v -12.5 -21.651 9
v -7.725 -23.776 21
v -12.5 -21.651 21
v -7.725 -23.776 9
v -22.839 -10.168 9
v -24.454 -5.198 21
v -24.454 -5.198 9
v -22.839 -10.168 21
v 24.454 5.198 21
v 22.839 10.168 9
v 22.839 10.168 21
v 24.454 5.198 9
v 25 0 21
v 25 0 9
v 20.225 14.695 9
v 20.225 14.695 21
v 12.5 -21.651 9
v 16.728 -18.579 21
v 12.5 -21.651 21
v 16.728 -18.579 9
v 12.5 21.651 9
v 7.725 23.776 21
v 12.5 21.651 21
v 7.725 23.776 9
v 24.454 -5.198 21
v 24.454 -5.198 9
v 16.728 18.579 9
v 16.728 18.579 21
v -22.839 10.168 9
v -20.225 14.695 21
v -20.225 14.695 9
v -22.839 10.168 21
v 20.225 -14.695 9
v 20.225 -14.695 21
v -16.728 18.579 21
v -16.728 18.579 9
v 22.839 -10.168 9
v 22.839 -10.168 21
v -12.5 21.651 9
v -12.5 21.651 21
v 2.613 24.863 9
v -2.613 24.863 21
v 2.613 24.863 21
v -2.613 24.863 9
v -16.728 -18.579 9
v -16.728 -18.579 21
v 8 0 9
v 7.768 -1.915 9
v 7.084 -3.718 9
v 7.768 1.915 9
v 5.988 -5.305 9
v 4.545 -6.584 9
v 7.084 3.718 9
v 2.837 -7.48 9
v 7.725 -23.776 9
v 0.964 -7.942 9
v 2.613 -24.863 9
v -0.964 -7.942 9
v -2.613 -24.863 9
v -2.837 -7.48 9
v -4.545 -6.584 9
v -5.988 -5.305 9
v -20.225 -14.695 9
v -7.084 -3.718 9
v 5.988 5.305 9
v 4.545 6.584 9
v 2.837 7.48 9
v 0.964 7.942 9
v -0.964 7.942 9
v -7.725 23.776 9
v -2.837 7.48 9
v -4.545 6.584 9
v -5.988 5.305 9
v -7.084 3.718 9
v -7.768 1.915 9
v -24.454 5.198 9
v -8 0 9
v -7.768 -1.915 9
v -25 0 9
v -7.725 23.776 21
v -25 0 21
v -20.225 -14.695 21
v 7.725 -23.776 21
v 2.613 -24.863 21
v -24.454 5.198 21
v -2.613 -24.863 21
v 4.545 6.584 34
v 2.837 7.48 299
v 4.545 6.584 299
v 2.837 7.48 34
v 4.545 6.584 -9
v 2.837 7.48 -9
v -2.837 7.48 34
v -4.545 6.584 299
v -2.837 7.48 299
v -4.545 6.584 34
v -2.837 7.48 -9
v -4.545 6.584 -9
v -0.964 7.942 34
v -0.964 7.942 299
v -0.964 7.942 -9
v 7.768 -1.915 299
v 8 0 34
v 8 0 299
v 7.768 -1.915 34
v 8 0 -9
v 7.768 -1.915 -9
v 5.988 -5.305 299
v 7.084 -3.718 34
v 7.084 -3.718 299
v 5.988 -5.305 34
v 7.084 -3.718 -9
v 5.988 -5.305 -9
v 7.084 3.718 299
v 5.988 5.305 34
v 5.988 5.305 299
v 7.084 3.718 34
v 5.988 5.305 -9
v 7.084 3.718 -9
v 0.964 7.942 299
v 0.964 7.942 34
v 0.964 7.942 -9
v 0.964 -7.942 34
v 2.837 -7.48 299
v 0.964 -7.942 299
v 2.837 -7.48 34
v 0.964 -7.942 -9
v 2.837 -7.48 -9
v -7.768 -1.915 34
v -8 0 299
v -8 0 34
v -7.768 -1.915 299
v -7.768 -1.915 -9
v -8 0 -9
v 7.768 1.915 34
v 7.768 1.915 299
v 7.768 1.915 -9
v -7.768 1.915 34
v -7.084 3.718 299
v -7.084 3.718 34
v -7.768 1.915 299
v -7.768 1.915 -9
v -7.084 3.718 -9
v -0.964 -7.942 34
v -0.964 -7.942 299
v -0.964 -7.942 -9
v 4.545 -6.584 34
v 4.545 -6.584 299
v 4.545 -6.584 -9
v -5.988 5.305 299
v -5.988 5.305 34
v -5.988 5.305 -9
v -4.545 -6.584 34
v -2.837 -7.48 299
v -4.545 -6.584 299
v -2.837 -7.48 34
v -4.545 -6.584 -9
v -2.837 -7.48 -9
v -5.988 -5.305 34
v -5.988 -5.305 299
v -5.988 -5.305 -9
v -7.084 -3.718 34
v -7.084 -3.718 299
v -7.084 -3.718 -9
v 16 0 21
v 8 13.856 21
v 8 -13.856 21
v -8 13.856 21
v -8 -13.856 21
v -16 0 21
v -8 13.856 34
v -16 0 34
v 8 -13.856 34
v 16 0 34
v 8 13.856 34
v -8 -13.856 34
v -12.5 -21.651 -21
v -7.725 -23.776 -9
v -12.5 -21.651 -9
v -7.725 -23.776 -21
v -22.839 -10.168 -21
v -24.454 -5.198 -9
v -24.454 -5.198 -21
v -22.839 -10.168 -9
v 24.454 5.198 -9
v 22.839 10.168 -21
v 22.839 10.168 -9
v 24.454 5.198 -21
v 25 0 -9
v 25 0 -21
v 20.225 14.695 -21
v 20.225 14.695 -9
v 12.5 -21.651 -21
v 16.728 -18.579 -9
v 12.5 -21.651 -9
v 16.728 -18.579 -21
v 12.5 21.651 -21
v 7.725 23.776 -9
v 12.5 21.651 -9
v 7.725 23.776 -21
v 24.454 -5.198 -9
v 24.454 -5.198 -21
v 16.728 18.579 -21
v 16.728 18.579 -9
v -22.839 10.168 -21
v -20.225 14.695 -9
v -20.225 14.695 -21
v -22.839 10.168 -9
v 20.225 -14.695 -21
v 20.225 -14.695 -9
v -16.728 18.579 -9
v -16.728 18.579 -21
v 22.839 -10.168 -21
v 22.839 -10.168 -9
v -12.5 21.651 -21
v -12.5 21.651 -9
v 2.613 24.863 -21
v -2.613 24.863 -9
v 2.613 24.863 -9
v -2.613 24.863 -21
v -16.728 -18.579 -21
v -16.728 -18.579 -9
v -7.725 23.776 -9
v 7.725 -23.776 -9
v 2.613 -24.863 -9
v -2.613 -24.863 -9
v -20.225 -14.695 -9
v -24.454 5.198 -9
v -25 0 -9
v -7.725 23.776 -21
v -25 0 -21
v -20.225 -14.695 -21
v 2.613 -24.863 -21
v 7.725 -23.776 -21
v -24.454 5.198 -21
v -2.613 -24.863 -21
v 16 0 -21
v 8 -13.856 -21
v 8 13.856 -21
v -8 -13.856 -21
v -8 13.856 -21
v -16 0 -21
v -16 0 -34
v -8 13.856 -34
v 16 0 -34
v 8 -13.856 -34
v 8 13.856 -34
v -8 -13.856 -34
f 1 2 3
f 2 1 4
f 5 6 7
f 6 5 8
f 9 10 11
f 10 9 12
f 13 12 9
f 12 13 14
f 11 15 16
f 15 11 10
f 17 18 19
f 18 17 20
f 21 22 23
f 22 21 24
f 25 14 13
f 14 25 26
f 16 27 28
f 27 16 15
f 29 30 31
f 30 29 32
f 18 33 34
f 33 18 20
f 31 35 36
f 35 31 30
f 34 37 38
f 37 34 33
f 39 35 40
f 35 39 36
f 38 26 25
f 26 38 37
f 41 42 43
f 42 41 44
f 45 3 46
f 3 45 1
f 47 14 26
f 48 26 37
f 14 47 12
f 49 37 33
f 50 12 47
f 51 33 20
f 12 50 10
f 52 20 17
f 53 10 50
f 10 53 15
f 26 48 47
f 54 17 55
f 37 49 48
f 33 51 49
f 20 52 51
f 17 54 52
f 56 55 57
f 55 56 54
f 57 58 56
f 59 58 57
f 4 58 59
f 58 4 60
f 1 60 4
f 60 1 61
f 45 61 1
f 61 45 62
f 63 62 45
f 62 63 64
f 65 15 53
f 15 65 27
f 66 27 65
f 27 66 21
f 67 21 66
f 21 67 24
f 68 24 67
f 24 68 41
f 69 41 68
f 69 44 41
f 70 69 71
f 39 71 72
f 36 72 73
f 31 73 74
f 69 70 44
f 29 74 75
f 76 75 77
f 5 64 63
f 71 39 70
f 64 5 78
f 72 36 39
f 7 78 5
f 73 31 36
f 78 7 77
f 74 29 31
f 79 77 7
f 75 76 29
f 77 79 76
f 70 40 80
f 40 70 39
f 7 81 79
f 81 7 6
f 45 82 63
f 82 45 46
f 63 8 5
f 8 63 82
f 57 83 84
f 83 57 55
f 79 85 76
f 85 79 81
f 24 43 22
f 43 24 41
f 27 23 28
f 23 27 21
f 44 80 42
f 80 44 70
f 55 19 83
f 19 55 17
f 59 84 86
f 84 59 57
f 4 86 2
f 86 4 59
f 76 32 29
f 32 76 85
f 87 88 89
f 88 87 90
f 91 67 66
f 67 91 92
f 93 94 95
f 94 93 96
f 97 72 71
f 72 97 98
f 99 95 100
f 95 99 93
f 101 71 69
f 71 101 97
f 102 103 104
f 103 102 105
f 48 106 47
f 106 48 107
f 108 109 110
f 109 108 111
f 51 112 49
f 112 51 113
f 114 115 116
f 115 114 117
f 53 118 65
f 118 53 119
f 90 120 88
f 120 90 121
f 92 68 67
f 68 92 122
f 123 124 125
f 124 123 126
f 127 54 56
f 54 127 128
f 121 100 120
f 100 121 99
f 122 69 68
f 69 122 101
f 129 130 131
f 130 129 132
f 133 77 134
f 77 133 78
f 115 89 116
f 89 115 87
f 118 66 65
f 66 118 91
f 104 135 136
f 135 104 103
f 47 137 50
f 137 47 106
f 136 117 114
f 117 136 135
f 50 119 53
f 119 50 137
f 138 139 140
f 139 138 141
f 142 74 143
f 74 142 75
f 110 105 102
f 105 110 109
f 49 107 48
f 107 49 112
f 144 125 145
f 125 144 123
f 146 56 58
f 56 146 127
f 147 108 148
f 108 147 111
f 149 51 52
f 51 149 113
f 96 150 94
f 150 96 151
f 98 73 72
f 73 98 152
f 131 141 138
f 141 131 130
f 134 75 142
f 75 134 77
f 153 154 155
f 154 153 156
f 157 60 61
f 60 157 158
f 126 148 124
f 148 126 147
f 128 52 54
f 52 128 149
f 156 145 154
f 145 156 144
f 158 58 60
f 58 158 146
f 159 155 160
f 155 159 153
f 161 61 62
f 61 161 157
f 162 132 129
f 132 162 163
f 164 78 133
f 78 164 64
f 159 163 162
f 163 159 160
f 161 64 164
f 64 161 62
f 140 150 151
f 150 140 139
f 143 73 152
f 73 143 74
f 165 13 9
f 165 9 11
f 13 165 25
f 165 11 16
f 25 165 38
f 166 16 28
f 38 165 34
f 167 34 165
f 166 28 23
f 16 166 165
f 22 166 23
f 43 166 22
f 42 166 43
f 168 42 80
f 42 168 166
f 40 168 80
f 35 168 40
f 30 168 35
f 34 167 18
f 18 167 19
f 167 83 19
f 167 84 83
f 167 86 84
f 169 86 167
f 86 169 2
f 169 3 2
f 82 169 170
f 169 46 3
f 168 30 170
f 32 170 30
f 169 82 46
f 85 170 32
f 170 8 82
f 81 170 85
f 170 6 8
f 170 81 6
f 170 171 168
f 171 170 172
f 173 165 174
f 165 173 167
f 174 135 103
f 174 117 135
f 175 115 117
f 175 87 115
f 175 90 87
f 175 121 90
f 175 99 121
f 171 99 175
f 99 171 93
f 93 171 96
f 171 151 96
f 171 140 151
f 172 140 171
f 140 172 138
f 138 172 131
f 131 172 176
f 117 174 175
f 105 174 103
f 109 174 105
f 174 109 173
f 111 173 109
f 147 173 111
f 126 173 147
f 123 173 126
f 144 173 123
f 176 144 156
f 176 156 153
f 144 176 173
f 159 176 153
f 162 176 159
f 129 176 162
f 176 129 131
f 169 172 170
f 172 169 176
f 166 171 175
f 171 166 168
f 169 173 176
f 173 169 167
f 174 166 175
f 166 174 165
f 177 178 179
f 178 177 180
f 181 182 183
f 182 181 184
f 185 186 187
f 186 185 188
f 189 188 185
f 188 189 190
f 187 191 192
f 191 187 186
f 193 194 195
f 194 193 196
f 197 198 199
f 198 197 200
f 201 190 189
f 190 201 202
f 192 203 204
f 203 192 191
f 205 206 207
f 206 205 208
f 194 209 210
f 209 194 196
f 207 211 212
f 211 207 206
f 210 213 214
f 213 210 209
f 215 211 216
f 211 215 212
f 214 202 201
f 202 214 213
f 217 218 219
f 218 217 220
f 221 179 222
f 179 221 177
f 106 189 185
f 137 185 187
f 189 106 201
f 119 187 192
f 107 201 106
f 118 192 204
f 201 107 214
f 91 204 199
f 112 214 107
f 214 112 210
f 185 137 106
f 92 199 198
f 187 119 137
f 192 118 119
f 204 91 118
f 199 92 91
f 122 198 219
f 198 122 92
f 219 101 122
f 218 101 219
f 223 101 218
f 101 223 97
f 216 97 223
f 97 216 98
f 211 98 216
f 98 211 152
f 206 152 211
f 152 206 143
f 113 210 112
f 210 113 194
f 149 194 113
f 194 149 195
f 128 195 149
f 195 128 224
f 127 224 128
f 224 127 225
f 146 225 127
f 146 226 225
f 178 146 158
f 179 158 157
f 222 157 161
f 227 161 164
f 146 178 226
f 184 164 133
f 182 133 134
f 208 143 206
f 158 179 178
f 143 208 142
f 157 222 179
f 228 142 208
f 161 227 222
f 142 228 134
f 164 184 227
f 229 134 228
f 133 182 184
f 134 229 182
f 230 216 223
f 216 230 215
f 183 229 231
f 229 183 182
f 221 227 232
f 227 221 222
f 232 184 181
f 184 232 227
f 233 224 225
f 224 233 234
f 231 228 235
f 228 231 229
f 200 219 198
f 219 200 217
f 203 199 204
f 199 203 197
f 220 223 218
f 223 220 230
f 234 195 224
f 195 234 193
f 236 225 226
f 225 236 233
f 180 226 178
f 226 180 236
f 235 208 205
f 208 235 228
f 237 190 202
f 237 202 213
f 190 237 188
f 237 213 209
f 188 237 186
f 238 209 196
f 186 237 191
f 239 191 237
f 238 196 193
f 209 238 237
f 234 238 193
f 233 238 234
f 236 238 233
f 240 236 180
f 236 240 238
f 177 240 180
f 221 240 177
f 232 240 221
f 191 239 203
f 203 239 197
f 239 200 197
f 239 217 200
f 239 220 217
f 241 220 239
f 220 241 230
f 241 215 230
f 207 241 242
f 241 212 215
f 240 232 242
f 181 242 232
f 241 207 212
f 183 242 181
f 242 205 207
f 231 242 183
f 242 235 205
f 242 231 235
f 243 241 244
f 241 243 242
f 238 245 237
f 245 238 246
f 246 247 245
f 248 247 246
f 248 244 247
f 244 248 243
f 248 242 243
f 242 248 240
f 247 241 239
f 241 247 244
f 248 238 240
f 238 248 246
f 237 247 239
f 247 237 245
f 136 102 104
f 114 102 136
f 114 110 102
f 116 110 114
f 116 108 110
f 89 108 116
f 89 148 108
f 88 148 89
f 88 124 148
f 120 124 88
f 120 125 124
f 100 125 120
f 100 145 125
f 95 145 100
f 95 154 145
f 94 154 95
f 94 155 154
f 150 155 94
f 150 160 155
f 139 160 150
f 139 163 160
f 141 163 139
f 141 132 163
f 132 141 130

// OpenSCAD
// file: ../common/beam_hexagonal.scad
// include <../../config.scad>;

module beam_hexagonal(L, d, centre = true, suppress_shopping_outputs = false) {
    radius = d / 2;
    linear_extrude(L, center = centre) polygon([[radius, 0], [radius * cos(60), radius * sin(60)], [radius * cos(120), radius * sin(120)], [radius * cos(180), radius * sin(180)], [radius * cos(240), radius * sin(240)], [radius * cos(300), radius * sin(300)]]);
    // Shopping
    if (!suppress_shopping_outputs) {
        echo(str("Hexagonal beam: Hexagonal beam Φ", d, "mm x ", L, "mm - x1"));
    }
}

// $fn = 200;
beam_hexagonal(500, 50);
// file: ../fixings/tube_clamp_square_base_plate_132_functions.scad
function get_L_shaft_with_base_plate_square_base_plate_132(beam_width) = 
    // (beam_width == 40) ?
    75
;
function get_R_plate_square_base_plate_132(beam_width) = 
    // (beam_width == 40) ?
    [143, 75, 18.5]
;
function get_thickness_square_base_plate_132(beam_width) = 
    // (beam_width == 40) ?
    8
;
function get_offset_hole_x_square_base_plate_132(beam_width) = 
    // (beam_width == 40) ?
    100 / 2
;
function get_diameter_hole_square_base_plate_132(beam_width) = 
    // (beam_width == 40) ?
    10
;
// file: ../fixings/tube_clamp_round_base_plate_132_functions.scad
function get_L_shaft_with_base_plate_round_base_plate_132(tube_diameter) = 
    (tube_diameter == 27) ? 
        85
    : (tube_diameter == 42) ?
        122
    : 25
;
function get_R_plate_round_base_plate_132(tube_diameter) = 
    (tube_diameter == 27) ? 
        [64, 114, 7]
    : (tube_diameter == 42) ?
        [80, 140, 10]
    : [10, 20, 1]
;
function get_offset_hole_y_round_base_plate_132(tube_diameter) = 
    (tube_diameter == 27) ? 
        38
    : (tube_diameter == 42) ?
        50
    : 10
;
function get_diameter_hole_round_base_plate_132(tube_diameter) = 10;
// file: ../fixings/tube_clamp_round_3_way_through_116_functions.scad
function  get_L_shaft_long_round_3_way_through_116(tube_diameter) = 
    (tube_diameter == 27) ? 
        42
    : (tube_diameter == 42) ?
        60
    : 25
;
function get_thickness_round_3_way_through_116(tube_diameter) = 7;
function get_L_shaft_short_round_3_way_through_116(tube_diameter) = tube_diameter + 2 * get_thickness_round_3_way_through_116();
// file: ../fixings/tube_clamp_round_tee_long_104_functions.scad
// include <../../config.scad>;

function get_L_shaft_long_round_tee_long_104(tube_diameter) = 
    (tube_diameter == 27) ? 
        85
    : (tube_diameter == 42) ?
        122
    : 25
;
function get_L_shaft_short_round_tee_long_104(tube_diameter) = 
    (tube_diameter == 27) ? 
        42
    : (tube_diameter == 42) ?
        61
    : 10
;
// file: ../brake/brake_assembly_functions.scad
// include <../../config.scad>; // circular reference!

function get_y_pos_lead_fixing_ballscrew_to_brake_arms(angle_brake_rod, y_pos_axle_rear, x_pos_axle_leg_rear, x_offset_fixing_brake_arm_to_lead_plate) = y_pos_axle_rear + (x_pos_axle_leg_rear - x_offset_fixing_brake_arm_to_lead_plate) / tan(angle_brake_rod); // (X_POS_AXLE_LEG_REAR - X_OFFSET_FIXING_BRAKE_ARM_TO_LEAD_PLATE)
// file: ../common/washer.scad
include <../../config.scad>;

module washer(t, d_outer, d_inner, centre = true) {
    r_outer = d_outer / 2;
    r_inner = d_inner / 2;
    color("silver") difference() {
        cylinder(t, r_outer, r_outer, center = centre);
        cylinder(t, r_inner, r_inner, center = centre);
    }
    // Shopping
    echo(str("Washer: Washer Φ", d_outer, "mm x ", d_inner, "mm x ", t, "mm - x1"));
}

// $fn = 200;
washer(3, 10, 40);
// file: ../common/metric_nut.scad
// include <../../config.scad>;
use <./beam_hexagonal.scad>;
use <./metric_bolt_functions.scad>;

module metric_nut(size, centre = true) {
    height = get_metric_bolt_head_height(size);
    diameter = get_metric_bolt_head_diameter(size);
    radius = diameter / 2;
    color("gray") difference() {
        // body
        beam_hexagonal(height, diameter, centre = centre, suppress_shopping_outputs = true);
        // hole
        cylinder(height, size / 2, size / 2, center = centre);
    }
    // Shopping
    echo(str("Nut: Nut M", size, " - x1"));
}

// $fn = 200;
metric_nut(12);
// file: ../common/metric_bolt_functions.scad
function get_metric_bolt_head_height(size) = size;
function get_metric_bolt_head_diameter(size) = size * 2;
function get_metric_bolt_washer_diameter_safe_working_clearance(size) = 
    (size < 20) ?
        4 * size
    :
        3 * size
;
// main file
include <../../config.scad>;
use <../common/metric_bolt_functions.scad>;
use <../common/metric_nut.scad>;
use <../common/washer.scad>;

module fixing_top_crate_shaft() {
    echo("Fixing top crate shaft:");
    h_nut = get_metric_bolt_head_height(D_SHAFT_TOP_CRATE);
    union() {
        // shaft (threaded rod)
        color(COLOUR_ROD_THREADED) translate([0, 0, -R_BED[2] / 2 - T_WASHER_SHAFT_TOP_CRATE * COUNT_WASHERS_SHAFT_TOP_CRATE_EACH_END - h_nut]) cylinder(L_SHAFT_TOP_CRATE, D_SHAFT_TOP_CRATE / 2, D_SHAFT_TOP_CRATE / 2, center = false);
        // fixing
        for (index_side_bed_z = [0 : 1 : 1]) {
            mirror([0, 0, index_side_bed_z]) {
                // washers
                for (index_washer = [0 : 1 : COUNT_WASHERS_SHAFT_TOP_CRATE_EACH_END]) {
                    translate([0, 0, R_BED[2] / 2 + T_WASHER_SHAFT_TOP_CRATE * index_washer]) washer(T_WASHER_SHAFT_TOP_CRATE, D_WASHER_SHAFT_TOP_CRATE, D_SHAFT_TOP_CRATE, centre = false);
                }
                // nuts
                translate([0, 0, R_BED[2] / 2 + T_WASHER_SHAFT_TOP_CRATE * COUNT_WASHERS_SHAFT_TOP_CRATE_EACH_END]) metric_nut(D_SHAFT_TOP_CRATE, centre = false);
            }
        }
    }
    // Shopping
    echo(str("Top crate shaft: Threaded Steel rod M", D_SHAFT_TOP_CRATE, " x ", L_SHAFT_TOP_CRATE, "mm - x1"));
    // Fixing washers
    // Fixing nuts
}

fixing_top_crate_shaft();
